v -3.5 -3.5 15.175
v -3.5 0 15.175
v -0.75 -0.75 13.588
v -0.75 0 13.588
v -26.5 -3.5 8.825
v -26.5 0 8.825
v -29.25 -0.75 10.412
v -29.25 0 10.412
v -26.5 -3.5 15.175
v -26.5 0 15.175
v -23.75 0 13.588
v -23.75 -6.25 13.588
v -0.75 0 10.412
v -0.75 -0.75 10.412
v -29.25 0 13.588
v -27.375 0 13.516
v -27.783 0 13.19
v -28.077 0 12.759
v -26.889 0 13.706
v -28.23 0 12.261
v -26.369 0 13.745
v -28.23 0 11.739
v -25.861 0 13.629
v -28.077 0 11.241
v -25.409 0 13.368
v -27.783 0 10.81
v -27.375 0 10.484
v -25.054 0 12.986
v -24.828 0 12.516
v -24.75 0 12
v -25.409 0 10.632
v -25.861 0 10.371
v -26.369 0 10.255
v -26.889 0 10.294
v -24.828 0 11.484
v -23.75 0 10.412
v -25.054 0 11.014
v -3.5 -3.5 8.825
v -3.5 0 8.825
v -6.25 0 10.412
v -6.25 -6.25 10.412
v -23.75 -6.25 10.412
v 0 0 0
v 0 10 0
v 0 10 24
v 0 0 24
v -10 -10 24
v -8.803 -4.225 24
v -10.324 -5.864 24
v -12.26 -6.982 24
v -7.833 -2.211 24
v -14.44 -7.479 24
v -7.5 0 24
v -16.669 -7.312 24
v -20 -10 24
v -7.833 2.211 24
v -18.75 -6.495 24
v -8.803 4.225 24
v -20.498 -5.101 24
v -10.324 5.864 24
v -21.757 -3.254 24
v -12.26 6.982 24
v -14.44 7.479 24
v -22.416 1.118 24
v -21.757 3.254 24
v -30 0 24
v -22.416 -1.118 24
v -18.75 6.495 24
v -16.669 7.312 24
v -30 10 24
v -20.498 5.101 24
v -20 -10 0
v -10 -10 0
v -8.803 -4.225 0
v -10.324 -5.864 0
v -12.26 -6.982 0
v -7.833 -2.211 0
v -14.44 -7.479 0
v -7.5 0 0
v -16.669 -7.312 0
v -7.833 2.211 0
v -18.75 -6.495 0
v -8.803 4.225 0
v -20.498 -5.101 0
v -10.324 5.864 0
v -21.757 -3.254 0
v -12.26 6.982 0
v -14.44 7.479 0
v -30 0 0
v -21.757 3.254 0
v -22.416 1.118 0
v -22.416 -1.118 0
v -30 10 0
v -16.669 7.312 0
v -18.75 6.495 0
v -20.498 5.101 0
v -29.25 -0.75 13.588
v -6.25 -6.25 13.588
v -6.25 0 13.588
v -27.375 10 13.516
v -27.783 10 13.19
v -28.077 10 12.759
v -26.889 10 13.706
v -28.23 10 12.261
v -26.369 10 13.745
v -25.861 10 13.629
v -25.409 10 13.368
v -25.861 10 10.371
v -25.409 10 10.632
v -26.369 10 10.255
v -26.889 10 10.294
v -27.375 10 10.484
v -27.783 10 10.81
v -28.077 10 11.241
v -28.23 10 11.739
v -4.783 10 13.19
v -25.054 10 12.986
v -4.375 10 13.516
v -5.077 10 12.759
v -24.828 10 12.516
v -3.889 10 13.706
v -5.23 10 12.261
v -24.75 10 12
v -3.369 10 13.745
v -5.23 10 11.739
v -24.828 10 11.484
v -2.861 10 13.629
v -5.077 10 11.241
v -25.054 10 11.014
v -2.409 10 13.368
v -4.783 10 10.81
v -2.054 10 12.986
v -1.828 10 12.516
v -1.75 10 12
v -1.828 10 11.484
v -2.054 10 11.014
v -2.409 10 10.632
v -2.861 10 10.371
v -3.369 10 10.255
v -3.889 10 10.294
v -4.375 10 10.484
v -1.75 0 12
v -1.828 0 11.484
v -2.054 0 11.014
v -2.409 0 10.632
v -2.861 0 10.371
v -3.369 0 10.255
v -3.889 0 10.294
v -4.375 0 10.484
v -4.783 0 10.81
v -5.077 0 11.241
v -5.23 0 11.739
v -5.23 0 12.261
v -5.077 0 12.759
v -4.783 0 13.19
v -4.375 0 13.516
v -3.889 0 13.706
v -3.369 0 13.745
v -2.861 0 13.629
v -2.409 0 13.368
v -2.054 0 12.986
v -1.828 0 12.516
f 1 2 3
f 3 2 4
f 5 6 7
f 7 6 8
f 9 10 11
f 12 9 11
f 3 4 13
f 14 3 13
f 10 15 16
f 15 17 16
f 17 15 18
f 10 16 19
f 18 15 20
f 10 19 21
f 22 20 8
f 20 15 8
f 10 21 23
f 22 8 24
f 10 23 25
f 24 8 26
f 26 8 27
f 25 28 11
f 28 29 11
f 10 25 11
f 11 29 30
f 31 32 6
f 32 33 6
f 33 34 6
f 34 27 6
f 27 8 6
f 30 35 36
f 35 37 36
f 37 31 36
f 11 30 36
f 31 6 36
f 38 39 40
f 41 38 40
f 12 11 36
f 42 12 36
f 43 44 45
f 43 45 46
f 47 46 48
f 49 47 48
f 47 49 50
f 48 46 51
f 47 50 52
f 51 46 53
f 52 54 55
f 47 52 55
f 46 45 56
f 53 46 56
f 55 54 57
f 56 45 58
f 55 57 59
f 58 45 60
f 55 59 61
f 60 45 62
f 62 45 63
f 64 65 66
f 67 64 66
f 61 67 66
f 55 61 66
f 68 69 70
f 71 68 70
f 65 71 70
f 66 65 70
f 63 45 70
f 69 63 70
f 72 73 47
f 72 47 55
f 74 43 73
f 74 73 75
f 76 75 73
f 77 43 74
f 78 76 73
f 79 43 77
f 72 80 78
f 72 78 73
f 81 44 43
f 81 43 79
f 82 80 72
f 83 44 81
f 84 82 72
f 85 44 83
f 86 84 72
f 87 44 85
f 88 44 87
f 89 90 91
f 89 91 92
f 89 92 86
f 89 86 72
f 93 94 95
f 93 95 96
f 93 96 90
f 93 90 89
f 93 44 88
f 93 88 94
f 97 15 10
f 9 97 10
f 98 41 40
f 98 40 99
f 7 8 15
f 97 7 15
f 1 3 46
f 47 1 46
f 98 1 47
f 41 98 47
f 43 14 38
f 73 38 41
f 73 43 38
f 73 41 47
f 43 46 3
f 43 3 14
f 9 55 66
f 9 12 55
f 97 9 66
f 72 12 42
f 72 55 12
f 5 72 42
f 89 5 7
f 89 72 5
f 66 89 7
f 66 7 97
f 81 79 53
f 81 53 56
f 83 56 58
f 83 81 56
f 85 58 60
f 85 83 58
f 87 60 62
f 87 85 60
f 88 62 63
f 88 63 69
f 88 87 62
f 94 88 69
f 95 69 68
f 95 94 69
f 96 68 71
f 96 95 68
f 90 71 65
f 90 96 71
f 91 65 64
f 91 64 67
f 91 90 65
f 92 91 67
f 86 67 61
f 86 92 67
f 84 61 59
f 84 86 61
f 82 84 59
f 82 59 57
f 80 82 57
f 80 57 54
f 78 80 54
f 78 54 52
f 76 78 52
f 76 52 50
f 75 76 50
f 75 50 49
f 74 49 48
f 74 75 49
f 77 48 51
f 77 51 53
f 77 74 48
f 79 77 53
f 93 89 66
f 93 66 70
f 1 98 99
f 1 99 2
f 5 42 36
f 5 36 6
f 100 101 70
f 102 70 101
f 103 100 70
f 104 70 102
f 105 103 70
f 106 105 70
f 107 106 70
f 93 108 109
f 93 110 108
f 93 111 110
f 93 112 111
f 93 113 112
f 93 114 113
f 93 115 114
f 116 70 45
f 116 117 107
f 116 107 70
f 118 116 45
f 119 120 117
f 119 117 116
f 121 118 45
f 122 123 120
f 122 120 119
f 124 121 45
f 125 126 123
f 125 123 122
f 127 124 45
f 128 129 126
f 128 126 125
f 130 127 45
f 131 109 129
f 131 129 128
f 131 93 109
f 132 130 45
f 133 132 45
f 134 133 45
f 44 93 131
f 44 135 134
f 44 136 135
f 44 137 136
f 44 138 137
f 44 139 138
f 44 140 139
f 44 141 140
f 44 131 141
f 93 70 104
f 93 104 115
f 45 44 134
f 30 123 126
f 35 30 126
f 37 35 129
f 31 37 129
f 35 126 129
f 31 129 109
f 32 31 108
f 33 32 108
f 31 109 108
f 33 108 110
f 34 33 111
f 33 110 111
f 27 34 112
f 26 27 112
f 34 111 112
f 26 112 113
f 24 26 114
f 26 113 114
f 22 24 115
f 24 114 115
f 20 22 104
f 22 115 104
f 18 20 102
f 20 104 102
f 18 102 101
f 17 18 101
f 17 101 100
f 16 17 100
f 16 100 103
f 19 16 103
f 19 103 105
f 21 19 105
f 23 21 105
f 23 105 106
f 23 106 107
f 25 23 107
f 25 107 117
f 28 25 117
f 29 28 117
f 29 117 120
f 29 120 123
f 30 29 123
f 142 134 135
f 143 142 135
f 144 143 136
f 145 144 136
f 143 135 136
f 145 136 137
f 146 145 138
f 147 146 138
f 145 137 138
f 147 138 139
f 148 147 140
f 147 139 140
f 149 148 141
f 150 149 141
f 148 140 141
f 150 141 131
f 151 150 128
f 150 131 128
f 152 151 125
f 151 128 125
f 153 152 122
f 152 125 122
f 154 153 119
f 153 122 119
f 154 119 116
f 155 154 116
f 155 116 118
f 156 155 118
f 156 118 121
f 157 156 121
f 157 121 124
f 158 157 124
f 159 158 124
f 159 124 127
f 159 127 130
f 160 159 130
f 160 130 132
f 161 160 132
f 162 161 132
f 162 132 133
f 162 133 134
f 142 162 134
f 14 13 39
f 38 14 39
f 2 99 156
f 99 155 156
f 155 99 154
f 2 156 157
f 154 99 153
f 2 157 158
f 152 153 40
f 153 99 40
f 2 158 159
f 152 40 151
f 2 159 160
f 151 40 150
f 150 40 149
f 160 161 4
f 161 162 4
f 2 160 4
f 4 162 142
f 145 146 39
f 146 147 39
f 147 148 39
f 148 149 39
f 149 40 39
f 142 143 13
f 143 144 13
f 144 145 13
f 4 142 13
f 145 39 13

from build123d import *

# Parameters (mm, degrees)
SKETCH1_R           = 7.5
BOSS_EXTRUDE1_DEPTH = 24
SKETCH2_R           = 1.75
CUT_EXTRUDE1_DEPTH  = 24
CUT_EXTRUDE2_START  = -10
CUT_EXTRUDE2_DEPTH  = 7


with BuildPart() as part:
    # Sketch1 → Boss-Extrude1 (new body)
    with BuildSketch(Plane.XY):
        Polygon((0, 10), (0, 0), (-10, -10), (-20, -10), (-30, 0), (-30, 10), align=None)
        with Locations((-15, 0)):
            Circle(SKETCH1_R, mode=Mode.SUBTRACT)
    extrude(amount=BOSS_EXTRUDE1_DEPTH)

    # Sketch2 → Cut-Extrude1 (cut)
    with BuildSketch(Plane(origin=(0, 10, 0), x_dir=(1, 0, 0), z_dir=(0, 1, 0))):
        with Locations((-26.5, -12)):
            Circle(SKETCH2_R)
        with Locations((-3.5, -12)):
            Circle(SKETCH2_R)
    extrude(amount=-CUT_EXTRUDE1_DEPTH, mode=Mode.SUBTRACT)

    # Sketch4 → Cut-Extrude2 (cut)
    with BuildSketch(Plane(origin=(0, 10, 0), x_dir=(1, 0, 0), z_dir=(0, 1, 0)).offset(CUT_EXTRUDE2_START)):
        Polygon((-3.5, -15.175426481), (-0.75, -13.58771324), (-0.75, -10.41228676), (-3.5, -8.824573519), (-6.25, -10.41228676), (-6.25, -13.58771324), align=None)
        Polygon((-26.5, -15.175426481), (-23.75, -13.58771324), (-23.75, -10.41228676), (-26.5, -8.824573519), (-29.25, -10.41228676), (-29.25, -13.58771324), align=None)
    extrude(amount=-CUT_EXTRUDE2_DEPTH, mode=Mode.SUBTRACT)


solid = part.part
